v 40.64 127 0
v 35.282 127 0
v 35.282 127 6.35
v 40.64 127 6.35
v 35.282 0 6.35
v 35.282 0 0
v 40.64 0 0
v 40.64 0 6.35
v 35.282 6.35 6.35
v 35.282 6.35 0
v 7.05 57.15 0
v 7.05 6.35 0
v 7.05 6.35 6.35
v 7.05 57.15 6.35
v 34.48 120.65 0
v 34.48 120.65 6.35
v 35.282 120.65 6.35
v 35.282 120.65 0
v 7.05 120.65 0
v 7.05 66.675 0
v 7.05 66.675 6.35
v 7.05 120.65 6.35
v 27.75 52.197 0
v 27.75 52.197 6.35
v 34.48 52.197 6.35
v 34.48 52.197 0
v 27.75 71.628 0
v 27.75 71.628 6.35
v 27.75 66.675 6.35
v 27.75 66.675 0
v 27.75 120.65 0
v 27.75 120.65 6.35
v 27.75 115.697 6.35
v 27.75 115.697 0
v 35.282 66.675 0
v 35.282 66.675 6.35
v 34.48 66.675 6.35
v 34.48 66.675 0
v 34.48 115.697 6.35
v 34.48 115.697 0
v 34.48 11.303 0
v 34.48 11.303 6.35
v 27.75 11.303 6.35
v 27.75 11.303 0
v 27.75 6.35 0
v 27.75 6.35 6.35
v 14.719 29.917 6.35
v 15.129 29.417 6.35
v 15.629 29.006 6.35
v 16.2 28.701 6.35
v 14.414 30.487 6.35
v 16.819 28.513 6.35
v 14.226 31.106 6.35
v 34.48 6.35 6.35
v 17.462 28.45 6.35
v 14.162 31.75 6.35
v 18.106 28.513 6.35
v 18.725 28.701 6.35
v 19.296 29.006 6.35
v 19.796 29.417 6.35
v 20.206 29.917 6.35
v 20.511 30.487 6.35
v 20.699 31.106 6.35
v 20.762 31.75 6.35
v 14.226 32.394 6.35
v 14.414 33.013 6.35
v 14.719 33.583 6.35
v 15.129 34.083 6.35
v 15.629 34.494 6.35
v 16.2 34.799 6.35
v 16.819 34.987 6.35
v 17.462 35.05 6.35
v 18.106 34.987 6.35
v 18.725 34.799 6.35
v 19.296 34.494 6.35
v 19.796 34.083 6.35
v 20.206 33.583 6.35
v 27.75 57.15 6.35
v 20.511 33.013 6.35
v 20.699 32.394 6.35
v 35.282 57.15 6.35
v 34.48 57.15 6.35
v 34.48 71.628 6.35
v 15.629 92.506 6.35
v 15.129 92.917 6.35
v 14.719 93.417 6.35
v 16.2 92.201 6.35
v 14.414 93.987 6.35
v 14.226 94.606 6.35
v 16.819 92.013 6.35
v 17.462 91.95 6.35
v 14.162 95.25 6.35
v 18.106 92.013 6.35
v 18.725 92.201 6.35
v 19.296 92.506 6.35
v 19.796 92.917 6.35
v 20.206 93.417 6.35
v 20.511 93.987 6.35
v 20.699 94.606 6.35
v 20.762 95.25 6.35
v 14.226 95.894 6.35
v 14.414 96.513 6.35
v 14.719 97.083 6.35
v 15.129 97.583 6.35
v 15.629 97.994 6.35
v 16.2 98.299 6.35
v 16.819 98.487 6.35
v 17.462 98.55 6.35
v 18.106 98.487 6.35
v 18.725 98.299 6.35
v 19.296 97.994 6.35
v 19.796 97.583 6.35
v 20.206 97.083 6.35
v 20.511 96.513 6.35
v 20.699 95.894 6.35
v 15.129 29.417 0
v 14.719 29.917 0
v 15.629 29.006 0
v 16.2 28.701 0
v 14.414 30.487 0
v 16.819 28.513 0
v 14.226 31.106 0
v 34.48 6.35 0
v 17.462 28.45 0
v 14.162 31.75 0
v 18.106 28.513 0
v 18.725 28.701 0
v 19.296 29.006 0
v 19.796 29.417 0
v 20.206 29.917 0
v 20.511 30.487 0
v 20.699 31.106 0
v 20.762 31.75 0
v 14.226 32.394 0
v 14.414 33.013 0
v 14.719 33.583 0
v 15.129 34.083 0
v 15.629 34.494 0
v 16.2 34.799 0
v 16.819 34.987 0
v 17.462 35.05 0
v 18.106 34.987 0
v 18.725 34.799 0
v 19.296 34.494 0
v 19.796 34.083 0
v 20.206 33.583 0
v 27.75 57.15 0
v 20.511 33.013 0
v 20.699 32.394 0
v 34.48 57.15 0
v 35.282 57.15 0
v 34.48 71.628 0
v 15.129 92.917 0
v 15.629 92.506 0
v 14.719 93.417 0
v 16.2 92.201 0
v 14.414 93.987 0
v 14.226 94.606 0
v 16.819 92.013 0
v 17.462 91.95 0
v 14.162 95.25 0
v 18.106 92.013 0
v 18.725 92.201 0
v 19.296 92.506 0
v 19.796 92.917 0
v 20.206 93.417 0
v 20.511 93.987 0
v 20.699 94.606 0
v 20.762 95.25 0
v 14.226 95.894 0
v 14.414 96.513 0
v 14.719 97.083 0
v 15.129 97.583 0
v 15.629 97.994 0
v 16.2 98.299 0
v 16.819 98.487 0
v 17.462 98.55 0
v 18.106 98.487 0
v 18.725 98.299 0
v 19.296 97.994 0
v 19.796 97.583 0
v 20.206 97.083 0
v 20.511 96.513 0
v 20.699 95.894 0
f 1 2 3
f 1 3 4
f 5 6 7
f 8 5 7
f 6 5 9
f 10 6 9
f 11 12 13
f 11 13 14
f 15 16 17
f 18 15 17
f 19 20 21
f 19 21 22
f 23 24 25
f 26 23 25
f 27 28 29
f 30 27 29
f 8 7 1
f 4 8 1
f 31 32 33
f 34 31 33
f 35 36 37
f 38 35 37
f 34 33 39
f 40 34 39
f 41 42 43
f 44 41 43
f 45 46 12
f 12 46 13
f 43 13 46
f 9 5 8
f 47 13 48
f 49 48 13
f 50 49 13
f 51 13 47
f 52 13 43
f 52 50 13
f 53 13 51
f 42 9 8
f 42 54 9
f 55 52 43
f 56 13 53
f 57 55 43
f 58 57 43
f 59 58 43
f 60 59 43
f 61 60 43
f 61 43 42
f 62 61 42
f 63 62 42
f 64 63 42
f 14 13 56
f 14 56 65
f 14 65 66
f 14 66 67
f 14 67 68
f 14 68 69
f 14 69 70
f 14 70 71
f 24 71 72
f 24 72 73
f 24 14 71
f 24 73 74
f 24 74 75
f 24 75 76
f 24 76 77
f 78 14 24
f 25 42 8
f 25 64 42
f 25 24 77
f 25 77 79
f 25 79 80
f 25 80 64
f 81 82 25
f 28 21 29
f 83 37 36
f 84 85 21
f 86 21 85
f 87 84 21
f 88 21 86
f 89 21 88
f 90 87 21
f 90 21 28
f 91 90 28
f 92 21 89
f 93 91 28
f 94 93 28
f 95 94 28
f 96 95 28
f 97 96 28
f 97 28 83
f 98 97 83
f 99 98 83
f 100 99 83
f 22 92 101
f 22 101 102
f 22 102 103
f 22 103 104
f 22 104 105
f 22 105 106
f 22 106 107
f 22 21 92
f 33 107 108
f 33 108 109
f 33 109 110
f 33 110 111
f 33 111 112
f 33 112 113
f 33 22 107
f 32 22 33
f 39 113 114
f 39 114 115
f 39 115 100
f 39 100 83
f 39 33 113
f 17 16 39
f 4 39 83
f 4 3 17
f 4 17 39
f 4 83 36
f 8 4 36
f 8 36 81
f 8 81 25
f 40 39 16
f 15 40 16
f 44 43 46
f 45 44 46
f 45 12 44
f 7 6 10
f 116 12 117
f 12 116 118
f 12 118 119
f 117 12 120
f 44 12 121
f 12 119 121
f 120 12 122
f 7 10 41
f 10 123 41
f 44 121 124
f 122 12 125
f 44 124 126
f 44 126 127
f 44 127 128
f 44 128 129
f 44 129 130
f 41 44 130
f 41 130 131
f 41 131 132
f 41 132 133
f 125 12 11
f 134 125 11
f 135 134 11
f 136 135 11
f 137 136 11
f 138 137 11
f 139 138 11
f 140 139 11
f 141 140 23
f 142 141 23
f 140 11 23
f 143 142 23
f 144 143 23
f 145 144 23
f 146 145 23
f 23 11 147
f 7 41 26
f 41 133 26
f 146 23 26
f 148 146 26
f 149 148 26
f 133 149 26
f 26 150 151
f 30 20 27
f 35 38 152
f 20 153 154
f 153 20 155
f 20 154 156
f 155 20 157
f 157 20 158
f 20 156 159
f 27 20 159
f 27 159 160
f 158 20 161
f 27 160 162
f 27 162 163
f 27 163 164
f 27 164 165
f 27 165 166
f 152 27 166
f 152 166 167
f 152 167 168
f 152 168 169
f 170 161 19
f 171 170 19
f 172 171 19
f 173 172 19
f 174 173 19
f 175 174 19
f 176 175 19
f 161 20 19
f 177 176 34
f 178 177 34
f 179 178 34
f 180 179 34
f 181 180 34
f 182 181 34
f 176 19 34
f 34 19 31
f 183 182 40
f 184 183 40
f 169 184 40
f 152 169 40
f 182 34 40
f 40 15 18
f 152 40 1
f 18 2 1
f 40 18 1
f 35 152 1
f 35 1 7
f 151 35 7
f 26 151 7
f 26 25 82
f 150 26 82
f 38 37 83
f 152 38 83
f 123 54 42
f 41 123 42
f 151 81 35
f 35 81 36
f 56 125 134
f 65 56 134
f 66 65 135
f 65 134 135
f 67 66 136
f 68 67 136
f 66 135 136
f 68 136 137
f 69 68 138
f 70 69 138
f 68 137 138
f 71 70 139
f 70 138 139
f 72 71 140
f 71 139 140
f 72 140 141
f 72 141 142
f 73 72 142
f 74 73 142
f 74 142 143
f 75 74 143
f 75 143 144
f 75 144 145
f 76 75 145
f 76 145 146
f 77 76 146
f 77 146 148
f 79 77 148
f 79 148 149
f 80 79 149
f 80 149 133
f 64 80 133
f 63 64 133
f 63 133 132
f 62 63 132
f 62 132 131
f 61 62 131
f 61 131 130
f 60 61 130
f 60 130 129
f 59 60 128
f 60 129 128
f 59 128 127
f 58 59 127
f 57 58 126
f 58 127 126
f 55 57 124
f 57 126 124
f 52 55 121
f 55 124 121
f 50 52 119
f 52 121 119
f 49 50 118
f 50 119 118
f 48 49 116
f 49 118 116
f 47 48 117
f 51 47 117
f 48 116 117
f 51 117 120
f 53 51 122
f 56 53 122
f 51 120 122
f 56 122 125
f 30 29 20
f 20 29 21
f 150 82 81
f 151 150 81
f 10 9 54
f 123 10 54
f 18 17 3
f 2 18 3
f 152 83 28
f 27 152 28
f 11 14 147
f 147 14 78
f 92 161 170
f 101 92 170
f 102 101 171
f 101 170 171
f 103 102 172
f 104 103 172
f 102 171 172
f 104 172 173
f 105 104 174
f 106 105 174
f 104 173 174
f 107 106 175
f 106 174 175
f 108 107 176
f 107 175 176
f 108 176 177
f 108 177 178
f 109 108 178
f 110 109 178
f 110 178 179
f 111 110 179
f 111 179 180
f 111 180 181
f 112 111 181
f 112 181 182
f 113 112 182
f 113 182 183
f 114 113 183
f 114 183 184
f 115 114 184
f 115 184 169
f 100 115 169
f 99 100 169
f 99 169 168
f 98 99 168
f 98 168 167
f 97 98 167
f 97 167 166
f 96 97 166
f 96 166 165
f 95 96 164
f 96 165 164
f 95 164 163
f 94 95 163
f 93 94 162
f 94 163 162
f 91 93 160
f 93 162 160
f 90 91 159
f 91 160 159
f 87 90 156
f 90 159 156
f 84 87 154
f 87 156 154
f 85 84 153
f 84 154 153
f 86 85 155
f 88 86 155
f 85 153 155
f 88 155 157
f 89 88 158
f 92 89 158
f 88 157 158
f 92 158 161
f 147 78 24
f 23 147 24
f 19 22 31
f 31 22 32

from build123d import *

# Parameters (mm, degrees)
SKETCH2_W               = 40.64
SKETCH2_H               = 127
BOSS_EXTRUDE1_DEPTH     = 6.35
M6_CLEARANCE_HOLE1_D    = 6.6
CUT_EXTRUDE1_DEPTH      = 134.495063954
CUT_EXTRUDE1_DEPTH_BACK = 134.495063954
SKETCH5_W               = 7.0505
SKETCH5_H               = 127
SKETCH6_W               = 25.85012
SKETCH6_H               = 3.175
SKETCH6_W_2             = 27.8745
CUT_EXTRUDE2_DEPTH      = 134.495063954
SKETCH7_W               = 6.35
SKETCH7_H               = 4.7625
CUT_EXTRUDE3_DEPTH      = 134.495063954


with BuildPart() as part:
    # Sketch2 → Boss-Extrude1 (new body)
    with BuildSketch(Plane.XY):
        with Locations((20.32, 63.5)):
            Rectangle(SKETCH2_W, SKETCH2_H)
    extrude(amount=BOSS_EXTRUDE1_DEPTH)

    # M6 Clearance Hole1 (through all)
    with Locations(Plane.XY.offset(6.35)):
        with Locations((17.4625, 31.75), (17.4625, 95.25)):
            Hole(M6_CLEARANCE_HOLE1_D / 2)

    # Sketch5 → Cut-Extrude1 (cut, two sides: drawn at the far end of the back side and taken through both)
    with BuildSketch(Plane.XY.offset(6.35).offset(-CUT_EXTRUDE1_DEPTH_BACK)):
        with Locations((3.52525, 63.5)):
            Rectangle(SKETCH5_W, SKETCH5_H)
    extrude(amount=CUT_EXTRUDE1_DEPTH + CUT_EXTRUDE1_DEPTH_BACK, mode=Mode.SUBTRACT)

    # Sketch6 → Cut-Extrude2 (cut, through all)
    with BuildSketch(Plane.XY.offset(6.35)):
        Polygon((7.0505, 123.825), (7.0505, 120.65), (35.28187, 120.65), (35.28187, 127), (32.90062, 127), (32.90062, 123.825), align=None)
        with Locations((19.97556, 125.4125)):
            Rectangle(SKETCH6_W, SKETCH6_H)
        Polygon((35.28187, 66.675), (7.0505, 66.675), (7.0505, 63.5), (32.90062, 63.5), (32.90062, 60.325), (7.0505, 60.325), (7.0505, 57.15), (35.28187, 57.15), align=None)
        with Locations((19.97556, 61.9125)):
            Rectangle(SKETCH6_W, SKETCH6_H)
        Polygon((35.28187, 0), (35.28187, 6.35), (7.0505, 6.35), (7.0505, 3.175), (34.925, 3.175), (34.925, 0), align=None)
        with Locations((20.98775, 1.5875)):
            Rectangle(SKETCH6_W_2, SKETCH6_H)
    extrude(amount=-CUT_EXTRUDE2_DEPTH, mode=Mode.SUBTRACT)

    # Sketch7 → Cut-Extrude3 (cut, through all)
    with BuildSketch(Plane.XY.offset(6.35)):
        with Locations((31.115, 8.73125)):
            Rectangle(SKETCH7_W, SKETCH7_H)
        Polygon((27.94, 11.1125), (34.29, 11.1125), (34.29, 6.35), (34.4805, 6.35), (34.4805, 11.303), (27.7495, 11.303), (27.7495, 6.35), (27.94, 6.35), align=None)
        Polygon((34.4805, 6.35), (34.29, 6.35), (27.94, 6.35), (27.7495, 6.35), (27.7495, 6.1595), (34.4805, 6.1595), align=None)
        with Locations((31.115, 54.76875)):
            Rectangle(SKETCH7_W, SKETCH7_H)
        Polygon((34.4805, 57.15), (34.29, 57.15), (34.29, 52.3875), (27.94, 52.3875), (27.94, 57.15), (27.7495, 57.15), (27.7495, 52.197), (34.4805, 52.197), align=None)
        Polygon((27.94, 57.15), (34.29, 57.15), (34.4805, 57.15), (34.4805, 57.3405), (27.7495, 57.3405), (27.7495, 57.15), align=None)
        Polygon((34.4805, 66.675), (34.29, 66.675), (27.94, 66.675), (27.7495, 66.675), (27.7495, 66.4845), (34.4805, 66.4845), align=None)
        with Locations((31.115, 69.05625)):
            Rectangle(SKETCH7_W, SKETCH7_H)
        Polygon((27.94, 71.4375), (34.29, 71.4375), (34.29, 66.675), (34.4805, 66.675), (34.4805, 71.628), (27.7495, 71.628), (27.7495, 66.675), (27.94, 66.675), align=None)
        with Locations((31.115, 118.26875)):
            Rectangle(SKETCH7_W, SKETCH7_H)
        Polygon((27.7495, 115.697), (34.4805, 115.697), (34.4805, 120.65), (34.29, 120.65), (34.29, 115.8875), (27.94, 115.8875), (27.94, 120.65), (27.7495, 120.65), align=None)
        Polygon((34.29, 120.65), (34.4805, 120.65), (34.4805, 120.8405), (27.7495, 120.8405), (27.7495, 120.65), (27.94, 120.65), align=None)
    extrude(amount=-CUT_EXTRUDE3_DEPTH, mode=Mode.SUBTRACT)


solid = part.part
